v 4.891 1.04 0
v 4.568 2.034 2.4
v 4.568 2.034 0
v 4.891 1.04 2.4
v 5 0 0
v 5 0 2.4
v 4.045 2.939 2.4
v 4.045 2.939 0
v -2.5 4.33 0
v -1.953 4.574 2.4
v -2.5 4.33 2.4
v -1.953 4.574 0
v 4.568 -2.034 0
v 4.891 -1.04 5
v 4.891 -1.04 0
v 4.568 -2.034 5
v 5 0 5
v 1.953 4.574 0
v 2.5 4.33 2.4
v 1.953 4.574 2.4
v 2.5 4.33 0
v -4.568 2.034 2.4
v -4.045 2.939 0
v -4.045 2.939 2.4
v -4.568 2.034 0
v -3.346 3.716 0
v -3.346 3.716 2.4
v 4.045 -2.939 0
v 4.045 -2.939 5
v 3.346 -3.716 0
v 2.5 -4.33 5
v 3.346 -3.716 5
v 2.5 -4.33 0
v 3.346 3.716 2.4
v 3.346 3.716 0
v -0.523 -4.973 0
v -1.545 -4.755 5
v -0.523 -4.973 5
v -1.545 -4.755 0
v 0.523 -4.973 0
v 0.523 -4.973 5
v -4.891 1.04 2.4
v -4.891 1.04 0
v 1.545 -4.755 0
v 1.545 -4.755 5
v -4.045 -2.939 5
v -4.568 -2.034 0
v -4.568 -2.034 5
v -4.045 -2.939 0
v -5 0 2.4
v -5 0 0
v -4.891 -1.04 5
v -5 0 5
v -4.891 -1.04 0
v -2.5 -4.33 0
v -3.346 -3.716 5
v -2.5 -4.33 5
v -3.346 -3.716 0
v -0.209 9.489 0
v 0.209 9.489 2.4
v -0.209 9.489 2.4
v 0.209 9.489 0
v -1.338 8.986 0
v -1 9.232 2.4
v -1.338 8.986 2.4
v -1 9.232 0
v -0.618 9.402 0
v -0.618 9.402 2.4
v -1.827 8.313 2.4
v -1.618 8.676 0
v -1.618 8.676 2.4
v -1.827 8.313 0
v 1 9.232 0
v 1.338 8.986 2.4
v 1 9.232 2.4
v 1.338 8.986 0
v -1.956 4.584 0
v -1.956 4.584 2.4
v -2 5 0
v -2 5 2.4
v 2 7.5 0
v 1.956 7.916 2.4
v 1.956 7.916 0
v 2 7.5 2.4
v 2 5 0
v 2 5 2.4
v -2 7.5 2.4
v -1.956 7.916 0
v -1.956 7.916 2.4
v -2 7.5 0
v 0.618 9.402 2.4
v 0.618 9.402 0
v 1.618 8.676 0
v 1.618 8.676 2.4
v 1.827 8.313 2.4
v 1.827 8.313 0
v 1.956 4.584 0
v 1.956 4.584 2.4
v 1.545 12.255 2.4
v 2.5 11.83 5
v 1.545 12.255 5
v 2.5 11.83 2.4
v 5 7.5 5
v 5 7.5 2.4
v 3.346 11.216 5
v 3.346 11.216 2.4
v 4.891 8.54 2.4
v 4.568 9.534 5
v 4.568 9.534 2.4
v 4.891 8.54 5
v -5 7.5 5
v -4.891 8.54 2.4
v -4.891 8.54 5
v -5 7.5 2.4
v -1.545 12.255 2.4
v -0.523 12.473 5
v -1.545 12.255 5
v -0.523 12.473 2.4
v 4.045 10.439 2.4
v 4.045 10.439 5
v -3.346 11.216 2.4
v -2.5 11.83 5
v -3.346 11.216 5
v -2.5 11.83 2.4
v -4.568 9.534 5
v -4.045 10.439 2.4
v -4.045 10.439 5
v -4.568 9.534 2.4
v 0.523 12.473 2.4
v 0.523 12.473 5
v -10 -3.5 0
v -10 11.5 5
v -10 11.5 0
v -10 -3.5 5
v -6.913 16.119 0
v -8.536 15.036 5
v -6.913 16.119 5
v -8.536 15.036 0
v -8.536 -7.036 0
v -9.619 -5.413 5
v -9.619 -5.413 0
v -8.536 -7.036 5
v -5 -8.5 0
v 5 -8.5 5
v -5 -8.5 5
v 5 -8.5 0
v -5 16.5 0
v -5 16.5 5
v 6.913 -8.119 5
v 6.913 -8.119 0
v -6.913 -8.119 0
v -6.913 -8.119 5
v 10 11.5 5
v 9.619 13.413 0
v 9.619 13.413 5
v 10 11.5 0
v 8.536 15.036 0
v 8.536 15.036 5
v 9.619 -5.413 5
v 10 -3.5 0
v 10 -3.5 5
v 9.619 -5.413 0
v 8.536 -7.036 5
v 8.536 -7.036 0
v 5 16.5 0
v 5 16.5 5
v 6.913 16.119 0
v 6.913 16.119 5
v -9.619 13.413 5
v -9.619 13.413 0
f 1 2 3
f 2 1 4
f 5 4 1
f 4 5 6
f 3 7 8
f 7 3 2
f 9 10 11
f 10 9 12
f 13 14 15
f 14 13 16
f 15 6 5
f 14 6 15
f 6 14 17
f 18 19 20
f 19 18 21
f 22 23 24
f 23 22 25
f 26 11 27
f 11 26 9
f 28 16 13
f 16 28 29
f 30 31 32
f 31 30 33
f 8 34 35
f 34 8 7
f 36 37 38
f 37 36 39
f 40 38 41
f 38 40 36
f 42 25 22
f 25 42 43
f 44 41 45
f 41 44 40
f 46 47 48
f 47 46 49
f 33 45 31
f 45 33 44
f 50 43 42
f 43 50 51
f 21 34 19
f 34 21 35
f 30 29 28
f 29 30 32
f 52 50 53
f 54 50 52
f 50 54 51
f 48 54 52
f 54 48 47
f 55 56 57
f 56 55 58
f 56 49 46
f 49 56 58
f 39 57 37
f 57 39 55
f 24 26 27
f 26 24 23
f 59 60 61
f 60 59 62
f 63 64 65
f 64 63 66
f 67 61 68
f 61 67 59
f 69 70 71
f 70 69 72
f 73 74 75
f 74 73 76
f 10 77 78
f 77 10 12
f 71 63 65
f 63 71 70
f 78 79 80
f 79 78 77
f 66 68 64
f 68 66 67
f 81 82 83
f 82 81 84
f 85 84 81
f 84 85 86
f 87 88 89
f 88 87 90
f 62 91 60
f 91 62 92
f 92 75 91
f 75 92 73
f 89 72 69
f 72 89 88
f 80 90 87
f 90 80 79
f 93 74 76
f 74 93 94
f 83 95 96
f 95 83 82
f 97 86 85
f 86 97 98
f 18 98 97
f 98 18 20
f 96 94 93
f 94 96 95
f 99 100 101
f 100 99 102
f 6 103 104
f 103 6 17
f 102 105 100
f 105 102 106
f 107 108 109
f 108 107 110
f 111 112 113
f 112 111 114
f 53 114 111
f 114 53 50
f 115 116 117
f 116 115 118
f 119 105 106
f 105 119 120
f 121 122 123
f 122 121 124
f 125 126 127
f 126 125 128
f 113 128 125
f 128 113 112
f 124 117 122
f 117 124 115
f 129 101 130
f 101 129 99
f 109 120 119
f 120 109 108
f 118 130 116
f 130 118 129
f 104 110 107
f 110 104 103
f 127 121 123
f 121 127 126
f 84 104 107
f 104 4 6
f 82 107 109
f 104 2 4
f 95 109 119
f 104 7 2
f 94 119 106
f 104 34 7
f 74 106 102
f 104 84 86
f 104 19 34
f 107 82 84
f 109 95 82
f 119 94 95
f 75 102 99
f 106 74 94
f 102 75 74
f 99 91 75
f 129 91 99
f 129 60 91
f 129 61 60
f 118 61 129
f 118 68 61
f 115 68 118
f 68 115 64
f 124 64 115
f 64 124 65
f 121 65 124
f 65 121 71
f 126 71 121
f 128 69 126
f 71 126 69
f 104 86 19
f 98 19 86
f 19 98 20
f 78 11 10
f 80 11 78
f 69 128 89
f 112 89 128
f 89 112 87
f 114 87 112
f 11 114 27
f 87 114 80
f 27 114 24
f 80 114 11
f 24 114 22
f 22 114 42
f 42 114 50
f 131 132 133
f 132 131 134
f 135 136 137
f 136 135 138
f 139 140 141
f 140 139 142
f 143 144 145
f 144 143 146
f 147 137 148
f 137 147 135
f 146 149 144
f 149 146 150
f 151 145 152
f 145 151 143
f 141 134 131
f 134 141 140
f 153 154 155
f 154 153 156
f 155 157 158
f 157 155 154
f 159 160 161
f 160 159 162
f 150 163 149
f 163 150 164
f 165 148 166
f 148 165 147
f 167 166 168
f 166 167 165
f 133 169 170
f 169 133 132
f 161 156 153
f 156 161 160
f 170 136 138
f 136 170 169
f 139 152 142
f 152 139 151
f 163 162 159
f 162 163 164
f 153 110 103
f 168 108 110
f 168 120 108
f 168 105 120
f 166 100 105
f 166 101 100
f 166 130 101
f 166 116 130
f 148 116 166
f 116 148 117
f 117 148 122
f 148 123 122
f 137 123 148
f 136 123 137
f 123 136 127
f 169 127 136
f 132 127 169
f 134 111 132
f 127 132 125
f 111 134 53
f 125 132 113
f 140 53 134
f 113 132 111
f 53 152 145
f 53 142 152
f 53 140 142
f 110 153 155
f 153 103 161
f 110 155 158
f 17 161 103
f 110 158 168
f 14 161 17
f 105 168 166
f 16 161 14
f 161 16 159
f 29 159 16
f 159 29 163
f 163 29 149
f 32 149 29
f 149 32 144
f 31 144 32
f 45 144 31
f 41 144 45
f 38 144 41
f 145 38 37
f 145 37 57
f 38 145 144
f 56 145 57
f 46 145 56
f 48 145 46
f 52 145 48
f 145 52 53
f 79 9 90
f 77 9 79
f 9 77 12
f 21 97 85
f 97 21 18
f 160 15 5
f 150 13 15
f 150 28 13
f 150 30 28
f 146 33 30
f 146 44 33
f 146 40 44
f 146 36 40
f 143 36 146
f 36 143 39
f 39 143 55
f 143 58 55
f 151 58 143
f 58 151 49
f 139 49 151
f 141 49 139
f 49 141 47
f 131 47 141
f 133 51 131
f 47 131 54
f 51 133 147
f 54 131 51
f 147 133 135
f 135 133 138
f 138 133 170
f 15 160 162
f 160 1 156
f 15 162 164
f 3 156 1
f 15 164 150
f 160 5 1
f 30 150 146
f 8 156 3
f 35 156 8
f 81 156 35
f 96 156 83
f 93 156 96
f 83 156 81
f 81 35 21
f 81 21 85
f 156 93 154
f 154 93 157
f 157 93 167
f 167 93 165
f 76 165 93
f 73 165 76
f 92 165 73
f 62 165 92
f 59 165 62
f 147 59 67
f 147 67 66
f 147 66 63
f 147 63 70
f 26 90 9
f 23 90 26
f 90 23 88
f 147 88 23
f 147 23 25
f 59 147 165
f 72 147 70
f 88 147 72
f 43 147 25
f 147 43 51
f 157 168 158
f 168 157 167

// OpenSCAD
rad_keyhole_head = 10 / 2;
dim_keyhole_head = 2.5;
rad_keyhole_neck = 4 / 2;
dim_keyhole_neck = dim_keyhole_head * 2;



module keyhole(length = 10){
	$fn = 30;
	translate([ 0, 0, -0.1]){
		cylinder(r = rad_keyhole_head, h = dim_keyhole_head + 1);
	
		hull(){
			translate([ 0, rad_keyhole_head, 0])cylinder(r = rad_keyhole_neck, h = dim_keyhole_neck);
			translate([ 0, rad_keyhole_head * 1.5, 0])cylinder(r = rad_keyhole_neck, h = dim_keyhole_neck);
		}
		hull(){
			translate([ 0, 0, dim_keyhole_head])cylinder(r = rad_keyhole_head, h = length);
			translate([ 0, rad_keyhole_head * 1.5, dim_keyhole_head])cylinder(r = rad_keyhole_head, h = length);
		}
	}
}

difference(){
	translate([ -5, -3.5, 0])minkowski(){cube([ 10, 15, 1]);cylinder(r=5,h=4);}
	keyhole();
}
